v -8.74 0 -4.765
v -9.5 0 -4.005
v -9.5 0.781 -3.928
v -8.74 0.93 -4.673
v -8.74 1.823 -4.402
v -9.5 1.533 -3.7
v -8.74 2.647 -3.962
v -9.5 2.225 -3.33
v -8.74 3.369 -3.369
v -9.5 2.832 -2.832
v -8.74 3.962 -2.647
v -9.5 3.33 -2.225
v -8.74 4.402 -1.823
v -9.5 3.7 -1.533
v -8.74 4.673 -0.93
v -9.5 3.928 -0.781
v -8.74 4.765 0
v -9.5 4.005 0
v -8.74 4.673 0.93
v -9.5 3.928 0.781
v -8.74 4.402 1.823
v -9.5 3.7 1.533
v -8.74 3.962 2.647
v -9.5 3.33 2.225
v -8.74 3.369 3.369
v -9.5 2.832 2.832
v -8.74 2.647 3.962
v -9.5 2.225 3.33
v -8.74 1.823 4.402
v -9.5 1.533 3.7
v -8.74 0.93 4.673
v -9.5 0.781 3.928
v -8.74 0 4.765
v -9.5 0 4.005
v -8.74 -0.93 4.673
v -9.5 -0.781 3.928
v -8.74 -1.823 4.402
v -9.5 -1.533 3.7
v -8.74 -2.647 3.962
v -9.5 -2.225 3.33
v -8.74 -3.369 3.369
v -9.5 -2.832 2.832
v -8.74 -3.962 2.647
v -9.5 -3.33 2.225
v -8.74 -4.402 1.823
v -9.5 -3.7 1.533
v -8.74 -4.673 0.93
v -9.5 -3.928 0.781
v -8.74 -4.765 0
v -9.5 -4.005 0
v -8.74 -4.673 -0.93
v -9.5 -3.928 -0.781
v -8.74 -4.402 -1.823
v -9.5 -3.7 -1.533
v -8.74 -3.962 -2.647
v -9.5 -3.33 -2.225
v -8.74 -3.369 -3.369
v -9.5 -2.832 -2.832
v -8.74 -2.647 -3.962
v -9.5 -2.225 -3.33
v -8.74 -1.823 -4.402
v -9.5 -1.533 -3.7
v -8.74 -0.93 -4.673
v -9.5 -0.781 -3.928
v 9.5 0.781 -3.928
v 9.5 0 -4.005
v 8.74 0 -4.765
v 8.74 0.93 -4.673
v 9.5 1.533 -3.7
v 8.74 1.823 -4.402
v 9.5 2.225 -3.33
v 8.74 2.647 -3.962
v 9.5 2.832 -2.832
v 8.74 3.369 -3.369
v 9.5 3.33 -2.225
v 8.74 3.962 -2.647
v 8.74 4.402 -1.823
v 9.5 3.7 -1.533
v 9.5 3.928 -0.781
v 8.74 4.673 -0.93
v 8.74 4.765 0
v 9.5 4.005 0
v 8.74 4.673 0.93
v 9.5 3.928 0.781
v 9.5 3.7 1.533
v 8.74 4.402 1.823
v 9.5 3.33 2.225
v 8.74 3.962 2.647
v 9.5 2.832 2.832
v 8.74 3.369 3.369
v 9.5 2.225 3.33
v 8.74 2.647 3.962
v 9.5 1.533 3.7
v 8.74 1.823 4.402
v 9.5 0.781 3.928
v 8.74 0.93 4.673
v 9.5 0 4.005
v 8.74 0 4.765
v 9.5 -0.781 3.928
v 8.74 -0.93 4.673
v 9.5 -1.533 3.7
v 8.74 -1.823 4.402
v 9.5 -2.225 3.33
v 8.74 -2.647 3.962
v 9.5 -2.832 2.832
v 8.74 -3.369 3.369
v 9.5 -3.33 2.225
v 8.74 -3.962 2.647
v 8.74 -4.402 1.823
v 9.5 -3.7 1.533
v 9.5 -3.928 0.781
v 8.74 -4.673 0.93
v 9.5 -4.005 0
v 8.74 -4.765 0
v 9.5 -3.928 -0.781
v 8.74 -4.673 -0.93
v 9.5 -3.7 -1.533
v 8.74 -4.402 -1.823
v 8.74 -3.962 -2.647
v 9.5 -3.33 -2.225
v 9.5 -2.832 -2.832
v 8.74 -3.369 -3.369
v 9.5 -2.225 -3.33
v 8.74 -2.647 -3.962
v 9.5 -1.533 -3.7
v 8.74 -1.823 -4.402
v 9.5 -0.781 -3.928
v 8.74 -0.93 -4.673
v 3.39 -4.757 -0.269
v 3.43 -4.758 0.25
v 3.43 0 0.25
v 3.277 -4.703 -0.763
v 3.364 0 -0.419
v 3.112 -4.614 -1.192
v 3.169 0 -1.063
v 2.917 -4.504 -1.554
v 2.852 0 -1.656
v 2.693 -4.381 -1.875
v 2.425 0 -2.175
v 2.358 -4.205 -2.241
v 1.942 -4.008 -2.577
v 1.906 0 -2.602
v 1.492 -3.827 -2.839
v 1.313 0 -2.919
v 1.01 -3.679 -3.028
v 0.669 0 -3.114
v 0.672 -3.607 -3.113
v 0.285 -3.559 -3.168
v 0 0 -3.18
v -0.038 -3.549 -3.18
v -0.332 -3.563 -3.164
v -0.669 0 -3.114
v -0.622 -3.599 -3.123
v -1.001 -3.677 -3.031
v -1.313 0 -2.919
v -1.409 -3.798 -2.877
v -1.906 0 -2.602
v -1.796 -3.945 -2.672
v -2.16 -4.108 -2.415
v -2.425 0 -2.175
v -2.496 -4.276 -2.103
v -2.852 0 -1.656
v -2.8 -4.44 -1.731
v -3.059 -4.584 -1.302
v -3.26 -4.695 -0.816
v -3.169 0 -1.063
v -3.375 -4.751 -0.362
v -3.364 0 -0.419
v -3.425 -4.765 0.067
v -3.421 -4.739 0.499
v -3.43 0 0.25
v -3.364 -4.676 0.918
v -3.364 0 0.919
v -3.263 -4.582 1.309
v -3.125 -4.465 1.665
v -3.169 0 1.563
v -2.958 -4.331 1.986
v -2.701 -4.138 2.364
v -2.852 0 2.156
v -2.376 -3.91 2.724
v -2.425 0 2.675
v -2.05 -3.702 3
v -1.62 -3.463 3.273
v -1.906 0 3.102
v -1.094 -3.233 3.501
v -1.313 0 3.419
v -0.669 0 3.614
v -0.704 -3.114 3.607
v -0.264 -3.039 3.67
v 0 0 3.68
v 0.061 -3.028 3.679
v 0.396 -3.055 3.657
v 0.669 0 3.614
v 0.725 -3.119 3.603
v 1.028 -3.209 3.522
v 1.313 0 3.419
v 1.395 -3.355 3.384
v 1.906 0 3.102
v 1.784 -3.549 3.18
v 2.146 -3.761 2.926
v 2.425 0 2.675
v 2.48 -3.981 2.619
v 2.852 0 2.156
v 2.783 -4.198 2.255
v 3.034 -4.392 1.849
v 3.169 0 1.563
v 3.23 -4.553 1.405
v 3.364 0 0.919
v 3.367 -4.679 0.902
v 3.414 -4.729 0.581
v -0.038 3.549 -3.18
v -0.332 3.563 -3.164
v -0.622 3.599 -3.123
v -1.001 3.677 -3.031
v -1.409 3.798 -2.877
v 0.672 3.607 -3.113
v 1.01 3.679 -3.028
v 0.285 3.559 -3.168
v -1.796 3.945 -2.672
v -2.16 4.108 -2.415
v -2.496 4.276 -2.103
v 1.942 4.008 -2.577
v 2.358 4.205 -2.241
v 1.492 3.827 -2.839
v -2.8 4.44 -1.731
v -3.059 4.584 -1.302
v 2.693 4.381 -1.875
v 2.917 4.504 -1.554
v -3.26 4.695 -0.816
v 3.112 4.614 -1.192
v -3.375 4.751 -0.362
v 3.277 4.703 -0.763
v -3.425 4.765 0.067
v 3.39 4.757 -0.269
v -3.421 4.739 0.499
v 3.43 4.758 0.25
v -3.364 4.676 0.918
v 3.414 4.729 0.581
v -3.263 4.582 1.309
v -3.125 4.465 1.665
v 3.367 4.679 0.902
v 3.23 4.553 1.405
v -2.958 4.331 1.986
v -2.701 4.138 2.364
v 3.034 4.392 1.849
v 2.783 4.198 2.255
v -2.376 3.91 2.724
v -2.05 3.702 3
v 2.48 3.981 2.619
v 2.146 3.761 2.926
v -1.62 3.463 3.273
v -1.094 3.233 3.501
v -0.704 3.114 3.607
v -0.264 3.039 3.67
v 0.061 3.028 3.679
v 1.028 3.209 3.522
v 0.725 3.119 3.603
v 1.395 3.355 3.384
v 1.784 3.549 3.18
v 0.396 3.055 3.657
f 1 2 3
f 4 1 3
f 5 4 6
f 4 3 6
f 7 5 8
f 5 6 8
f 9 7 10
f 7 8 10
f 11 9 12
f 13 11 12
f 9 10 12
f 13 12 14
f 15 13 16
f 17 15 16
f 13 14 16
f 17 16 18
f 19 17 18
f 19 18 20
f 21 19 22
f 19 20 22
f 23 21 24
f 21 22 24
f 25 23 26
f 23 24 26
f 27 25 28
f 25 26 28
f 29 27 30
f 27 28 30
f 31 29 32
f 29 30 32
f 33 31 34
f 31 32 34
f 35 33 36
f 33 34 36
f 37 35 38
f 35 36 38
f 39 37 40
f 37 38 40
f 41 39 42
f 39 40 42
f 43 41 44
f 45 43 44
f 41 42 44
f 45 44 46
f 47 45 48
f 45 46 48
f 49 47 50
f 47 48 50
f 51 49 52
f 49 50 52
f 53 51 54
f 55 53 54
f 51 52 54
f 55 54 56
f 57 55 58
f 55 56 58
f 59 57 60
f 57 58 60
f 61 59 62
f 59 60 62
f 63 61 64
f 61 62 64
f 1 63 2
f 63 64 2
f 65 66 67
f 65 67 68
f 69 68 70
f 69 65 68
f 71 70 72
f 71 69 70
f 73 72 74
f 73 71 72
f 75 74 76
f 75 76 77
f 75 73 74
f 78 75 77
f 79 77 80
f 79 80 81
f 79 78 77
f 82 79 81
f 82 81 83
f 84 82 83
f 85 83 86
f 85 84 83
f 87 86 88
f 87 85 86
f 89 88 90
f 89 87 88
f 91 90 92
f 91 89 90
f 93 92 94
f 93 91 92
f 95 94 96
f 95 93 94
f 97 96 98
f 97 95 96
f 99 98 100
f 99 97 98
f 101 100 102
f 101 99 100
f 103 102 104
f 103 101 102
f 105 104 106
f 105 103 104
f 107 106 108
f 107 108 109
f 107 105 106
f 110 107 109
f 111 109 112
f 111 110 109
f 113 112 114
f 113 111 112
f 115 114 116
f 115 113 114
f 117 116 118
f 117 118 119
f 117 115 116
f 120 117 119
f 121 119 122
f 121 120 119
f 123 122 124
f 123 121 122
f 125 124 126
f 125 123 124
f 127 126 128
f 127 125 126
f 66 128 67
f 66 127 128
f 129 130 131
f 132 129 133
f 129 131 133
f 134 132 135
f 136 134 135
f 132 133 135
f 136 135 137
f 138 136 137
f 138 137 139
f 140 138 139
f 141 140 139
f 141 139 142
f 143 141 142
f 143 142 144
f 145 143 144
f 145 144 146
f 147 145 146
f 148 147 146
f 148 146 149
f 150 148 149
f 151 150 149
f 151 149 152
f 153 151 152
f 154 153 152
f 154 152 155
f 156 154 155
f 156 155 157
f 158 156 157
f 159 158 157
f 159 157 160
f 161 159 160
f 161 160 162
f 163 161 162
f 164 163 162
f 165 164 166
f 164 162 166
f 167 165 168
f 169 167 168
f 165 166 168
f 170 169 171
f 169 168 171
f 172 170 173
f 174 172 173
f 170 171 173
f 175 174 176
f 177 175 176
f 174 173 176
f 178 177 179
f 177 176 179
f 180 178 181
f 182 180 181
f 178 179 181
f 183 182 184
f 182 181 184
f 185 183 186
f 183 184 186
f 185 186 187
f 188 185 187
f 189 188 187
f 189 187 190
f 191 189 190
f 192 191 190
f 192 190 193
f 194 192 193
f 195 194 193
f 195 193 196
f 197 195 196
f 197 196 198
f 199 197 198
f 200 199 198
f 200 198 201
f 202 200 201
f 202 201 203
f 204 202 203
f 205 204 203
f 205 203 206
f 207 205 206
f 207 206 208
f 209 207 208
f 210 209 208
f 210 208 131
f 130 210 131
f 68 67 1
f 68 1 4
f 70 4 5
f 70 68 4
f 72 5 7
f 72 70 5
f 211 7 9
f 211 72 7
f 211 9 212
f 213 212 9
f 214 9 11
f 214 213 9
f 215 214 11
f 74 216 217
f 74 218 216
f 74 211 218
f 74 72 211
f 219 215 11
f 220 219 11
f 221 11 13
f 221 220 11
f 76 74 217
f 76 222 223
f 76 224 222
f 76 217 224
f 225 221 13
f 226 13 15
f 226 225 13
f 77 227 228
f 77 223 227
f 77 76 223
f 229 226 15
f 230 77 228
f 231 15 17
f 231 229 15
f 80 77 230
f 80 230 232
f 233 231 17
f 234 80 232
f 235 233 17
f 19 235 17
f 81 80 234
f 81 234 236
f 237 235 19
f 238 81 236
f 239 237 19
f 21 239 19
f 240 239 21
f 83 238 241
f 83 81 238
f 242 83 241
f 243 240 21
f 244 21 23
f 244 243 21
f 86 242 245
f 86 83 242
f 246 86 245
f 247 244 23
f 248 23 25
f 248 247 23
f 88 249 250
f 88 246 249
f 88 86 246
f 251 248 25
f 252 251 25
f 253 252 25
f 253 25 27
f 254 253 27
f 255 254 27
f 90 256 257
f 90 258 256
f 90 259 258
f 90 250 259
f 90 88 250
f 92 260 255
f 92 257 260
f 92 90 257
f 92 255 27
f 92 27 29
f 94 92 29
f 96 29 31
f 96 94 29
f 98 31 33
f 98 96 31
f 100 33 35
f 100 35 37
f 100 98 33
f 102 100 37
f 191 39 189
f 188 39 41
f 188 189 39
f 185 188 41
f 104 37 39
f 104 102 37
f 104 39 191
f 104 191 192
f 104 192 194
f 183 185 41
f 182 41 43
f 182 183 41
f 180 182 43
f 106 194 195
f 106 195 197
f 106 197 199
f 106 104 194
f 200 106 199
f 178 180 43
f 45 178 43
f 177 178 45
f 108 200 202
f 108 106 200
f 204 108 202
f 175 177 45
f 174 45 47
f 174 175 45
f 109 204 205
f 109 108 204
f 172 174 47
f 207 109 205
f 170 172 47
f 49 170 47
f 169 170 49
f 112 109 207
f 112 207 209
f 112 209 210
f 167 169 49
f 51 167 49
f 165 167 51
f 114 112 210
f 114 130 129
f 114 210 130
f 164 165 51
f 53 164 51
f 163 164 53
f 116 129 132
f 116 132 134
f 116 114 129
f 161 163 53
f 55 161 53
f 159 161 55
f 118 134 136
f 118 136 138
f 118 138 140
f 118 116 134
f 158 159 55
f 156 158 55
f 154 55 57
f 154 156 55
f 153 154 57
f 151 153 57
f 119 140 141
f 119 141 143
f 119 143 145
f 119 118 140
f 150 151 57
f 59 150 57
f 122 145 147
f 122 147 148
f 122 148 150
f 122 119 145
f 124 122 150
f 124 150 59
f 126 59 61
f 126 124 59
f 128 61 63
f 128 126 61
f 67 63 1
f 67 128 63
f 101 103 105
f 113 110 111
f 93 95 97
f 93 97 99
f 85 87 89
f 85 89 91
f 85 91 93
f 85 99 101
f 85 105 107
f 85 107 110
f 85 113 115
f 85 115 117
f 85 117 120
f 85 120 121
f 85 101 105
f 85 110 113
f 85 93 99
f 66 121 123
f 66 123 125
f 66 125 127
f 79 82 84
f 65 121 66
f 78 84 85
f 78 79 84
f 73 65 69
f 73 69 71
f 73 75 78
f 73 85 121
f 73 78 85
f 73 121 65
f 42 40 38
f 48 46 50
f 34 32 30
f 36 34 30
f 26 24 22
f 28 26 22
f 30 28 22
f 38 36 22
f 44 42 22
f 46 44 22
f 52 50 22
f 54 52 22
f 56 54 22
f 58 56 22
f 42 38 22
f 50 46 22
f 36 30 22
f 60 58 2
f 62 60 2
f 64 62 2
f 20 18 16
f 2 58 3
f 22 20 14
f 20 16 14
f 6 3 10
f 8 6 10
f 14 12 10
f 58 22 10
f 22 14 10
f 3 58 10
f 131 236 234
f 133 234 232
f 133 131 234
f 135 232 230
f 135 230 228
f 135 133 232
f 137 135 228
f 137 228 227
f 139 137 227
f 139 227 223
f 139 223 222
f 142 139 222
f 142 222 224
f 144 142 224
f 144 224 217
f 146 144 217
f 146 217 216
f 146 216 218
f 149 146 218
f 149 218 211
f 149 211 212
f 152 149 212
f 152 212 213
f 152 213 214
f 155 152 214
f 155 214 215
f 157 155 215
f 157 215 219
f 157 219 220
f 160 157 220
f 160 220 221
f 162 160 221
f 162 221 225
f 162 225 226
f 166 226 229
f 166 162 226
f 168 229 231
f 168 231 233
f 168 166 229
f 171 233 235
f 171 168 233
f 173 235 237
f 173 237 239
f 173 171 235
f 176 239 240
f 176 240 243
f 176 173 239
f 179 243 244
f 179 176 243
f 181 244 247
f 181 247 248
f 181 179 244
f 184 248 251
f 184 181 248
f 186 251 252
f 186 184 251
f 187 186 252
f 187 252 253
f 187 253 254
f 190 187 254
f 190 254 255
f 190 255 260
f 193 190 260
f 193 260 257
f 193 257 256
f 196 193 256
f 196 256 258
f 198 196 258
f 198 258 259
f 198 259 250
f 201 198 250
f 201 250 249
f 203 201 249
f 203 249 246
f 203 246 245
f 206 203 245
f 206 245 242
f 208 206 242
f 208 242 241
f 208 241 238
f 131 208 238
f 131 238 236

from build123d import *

# Parameters (mm, degrees)
SKETCH1_R               = 4.765
BOSS_EXTRUDE1_DEPTH     = 9.5
CHAMFER1_SIZE           = 0.76
SKETCH2_R               = 3.43
CUT_EXTRUDE1_DEPTH      = 5.765
CUT_EXTRUDE1_DEPTH_BACK = 5.765


with BuildPart() as part:
    # Sketch1 → Boss-Extrude1 (new body, symmetric)
    with BuildSketch(Plane(origin=(0, 0, 0), x_dir=(0, 0, -1), z_dir=(1, 0, 0))):
        Circle(SKETCH1_R)
    extrude(amount=BOSS_EXTRUDE1_DEPTH, both=True)

    # Chamfer1
    chamfer1_edges = [part.edges().sort_by_distance(p)[0] for p in [
        (-9.5, 0, 4.765),
        (9.5, 0, 4.765),
    ]]
    chamfer(chamfer1_edges, length=CHAMFER1_SIZE)

    # Sketch2 → Cut-Extrude1 (cut, two sides)
    with BuildSketch(Plane(origin=(0, 0, 0), x_dir=(1, 0, 0), z_dir=(0, 1, 0))) as cut_extrude1_sk:
        with Locations((0, -0.25)):
            Circle(SKETCH2_R)
    extrude(amount=CUT_EXTRUDE1_DEPTH, mode=Mode.SUBTRACT)
    extrude(cut_extrude1_sk.sketch, amount=-CUT_EXTRUDE1_DEPTH_BACK, mode=Mode.SUBTRACT)


solid = part.part
